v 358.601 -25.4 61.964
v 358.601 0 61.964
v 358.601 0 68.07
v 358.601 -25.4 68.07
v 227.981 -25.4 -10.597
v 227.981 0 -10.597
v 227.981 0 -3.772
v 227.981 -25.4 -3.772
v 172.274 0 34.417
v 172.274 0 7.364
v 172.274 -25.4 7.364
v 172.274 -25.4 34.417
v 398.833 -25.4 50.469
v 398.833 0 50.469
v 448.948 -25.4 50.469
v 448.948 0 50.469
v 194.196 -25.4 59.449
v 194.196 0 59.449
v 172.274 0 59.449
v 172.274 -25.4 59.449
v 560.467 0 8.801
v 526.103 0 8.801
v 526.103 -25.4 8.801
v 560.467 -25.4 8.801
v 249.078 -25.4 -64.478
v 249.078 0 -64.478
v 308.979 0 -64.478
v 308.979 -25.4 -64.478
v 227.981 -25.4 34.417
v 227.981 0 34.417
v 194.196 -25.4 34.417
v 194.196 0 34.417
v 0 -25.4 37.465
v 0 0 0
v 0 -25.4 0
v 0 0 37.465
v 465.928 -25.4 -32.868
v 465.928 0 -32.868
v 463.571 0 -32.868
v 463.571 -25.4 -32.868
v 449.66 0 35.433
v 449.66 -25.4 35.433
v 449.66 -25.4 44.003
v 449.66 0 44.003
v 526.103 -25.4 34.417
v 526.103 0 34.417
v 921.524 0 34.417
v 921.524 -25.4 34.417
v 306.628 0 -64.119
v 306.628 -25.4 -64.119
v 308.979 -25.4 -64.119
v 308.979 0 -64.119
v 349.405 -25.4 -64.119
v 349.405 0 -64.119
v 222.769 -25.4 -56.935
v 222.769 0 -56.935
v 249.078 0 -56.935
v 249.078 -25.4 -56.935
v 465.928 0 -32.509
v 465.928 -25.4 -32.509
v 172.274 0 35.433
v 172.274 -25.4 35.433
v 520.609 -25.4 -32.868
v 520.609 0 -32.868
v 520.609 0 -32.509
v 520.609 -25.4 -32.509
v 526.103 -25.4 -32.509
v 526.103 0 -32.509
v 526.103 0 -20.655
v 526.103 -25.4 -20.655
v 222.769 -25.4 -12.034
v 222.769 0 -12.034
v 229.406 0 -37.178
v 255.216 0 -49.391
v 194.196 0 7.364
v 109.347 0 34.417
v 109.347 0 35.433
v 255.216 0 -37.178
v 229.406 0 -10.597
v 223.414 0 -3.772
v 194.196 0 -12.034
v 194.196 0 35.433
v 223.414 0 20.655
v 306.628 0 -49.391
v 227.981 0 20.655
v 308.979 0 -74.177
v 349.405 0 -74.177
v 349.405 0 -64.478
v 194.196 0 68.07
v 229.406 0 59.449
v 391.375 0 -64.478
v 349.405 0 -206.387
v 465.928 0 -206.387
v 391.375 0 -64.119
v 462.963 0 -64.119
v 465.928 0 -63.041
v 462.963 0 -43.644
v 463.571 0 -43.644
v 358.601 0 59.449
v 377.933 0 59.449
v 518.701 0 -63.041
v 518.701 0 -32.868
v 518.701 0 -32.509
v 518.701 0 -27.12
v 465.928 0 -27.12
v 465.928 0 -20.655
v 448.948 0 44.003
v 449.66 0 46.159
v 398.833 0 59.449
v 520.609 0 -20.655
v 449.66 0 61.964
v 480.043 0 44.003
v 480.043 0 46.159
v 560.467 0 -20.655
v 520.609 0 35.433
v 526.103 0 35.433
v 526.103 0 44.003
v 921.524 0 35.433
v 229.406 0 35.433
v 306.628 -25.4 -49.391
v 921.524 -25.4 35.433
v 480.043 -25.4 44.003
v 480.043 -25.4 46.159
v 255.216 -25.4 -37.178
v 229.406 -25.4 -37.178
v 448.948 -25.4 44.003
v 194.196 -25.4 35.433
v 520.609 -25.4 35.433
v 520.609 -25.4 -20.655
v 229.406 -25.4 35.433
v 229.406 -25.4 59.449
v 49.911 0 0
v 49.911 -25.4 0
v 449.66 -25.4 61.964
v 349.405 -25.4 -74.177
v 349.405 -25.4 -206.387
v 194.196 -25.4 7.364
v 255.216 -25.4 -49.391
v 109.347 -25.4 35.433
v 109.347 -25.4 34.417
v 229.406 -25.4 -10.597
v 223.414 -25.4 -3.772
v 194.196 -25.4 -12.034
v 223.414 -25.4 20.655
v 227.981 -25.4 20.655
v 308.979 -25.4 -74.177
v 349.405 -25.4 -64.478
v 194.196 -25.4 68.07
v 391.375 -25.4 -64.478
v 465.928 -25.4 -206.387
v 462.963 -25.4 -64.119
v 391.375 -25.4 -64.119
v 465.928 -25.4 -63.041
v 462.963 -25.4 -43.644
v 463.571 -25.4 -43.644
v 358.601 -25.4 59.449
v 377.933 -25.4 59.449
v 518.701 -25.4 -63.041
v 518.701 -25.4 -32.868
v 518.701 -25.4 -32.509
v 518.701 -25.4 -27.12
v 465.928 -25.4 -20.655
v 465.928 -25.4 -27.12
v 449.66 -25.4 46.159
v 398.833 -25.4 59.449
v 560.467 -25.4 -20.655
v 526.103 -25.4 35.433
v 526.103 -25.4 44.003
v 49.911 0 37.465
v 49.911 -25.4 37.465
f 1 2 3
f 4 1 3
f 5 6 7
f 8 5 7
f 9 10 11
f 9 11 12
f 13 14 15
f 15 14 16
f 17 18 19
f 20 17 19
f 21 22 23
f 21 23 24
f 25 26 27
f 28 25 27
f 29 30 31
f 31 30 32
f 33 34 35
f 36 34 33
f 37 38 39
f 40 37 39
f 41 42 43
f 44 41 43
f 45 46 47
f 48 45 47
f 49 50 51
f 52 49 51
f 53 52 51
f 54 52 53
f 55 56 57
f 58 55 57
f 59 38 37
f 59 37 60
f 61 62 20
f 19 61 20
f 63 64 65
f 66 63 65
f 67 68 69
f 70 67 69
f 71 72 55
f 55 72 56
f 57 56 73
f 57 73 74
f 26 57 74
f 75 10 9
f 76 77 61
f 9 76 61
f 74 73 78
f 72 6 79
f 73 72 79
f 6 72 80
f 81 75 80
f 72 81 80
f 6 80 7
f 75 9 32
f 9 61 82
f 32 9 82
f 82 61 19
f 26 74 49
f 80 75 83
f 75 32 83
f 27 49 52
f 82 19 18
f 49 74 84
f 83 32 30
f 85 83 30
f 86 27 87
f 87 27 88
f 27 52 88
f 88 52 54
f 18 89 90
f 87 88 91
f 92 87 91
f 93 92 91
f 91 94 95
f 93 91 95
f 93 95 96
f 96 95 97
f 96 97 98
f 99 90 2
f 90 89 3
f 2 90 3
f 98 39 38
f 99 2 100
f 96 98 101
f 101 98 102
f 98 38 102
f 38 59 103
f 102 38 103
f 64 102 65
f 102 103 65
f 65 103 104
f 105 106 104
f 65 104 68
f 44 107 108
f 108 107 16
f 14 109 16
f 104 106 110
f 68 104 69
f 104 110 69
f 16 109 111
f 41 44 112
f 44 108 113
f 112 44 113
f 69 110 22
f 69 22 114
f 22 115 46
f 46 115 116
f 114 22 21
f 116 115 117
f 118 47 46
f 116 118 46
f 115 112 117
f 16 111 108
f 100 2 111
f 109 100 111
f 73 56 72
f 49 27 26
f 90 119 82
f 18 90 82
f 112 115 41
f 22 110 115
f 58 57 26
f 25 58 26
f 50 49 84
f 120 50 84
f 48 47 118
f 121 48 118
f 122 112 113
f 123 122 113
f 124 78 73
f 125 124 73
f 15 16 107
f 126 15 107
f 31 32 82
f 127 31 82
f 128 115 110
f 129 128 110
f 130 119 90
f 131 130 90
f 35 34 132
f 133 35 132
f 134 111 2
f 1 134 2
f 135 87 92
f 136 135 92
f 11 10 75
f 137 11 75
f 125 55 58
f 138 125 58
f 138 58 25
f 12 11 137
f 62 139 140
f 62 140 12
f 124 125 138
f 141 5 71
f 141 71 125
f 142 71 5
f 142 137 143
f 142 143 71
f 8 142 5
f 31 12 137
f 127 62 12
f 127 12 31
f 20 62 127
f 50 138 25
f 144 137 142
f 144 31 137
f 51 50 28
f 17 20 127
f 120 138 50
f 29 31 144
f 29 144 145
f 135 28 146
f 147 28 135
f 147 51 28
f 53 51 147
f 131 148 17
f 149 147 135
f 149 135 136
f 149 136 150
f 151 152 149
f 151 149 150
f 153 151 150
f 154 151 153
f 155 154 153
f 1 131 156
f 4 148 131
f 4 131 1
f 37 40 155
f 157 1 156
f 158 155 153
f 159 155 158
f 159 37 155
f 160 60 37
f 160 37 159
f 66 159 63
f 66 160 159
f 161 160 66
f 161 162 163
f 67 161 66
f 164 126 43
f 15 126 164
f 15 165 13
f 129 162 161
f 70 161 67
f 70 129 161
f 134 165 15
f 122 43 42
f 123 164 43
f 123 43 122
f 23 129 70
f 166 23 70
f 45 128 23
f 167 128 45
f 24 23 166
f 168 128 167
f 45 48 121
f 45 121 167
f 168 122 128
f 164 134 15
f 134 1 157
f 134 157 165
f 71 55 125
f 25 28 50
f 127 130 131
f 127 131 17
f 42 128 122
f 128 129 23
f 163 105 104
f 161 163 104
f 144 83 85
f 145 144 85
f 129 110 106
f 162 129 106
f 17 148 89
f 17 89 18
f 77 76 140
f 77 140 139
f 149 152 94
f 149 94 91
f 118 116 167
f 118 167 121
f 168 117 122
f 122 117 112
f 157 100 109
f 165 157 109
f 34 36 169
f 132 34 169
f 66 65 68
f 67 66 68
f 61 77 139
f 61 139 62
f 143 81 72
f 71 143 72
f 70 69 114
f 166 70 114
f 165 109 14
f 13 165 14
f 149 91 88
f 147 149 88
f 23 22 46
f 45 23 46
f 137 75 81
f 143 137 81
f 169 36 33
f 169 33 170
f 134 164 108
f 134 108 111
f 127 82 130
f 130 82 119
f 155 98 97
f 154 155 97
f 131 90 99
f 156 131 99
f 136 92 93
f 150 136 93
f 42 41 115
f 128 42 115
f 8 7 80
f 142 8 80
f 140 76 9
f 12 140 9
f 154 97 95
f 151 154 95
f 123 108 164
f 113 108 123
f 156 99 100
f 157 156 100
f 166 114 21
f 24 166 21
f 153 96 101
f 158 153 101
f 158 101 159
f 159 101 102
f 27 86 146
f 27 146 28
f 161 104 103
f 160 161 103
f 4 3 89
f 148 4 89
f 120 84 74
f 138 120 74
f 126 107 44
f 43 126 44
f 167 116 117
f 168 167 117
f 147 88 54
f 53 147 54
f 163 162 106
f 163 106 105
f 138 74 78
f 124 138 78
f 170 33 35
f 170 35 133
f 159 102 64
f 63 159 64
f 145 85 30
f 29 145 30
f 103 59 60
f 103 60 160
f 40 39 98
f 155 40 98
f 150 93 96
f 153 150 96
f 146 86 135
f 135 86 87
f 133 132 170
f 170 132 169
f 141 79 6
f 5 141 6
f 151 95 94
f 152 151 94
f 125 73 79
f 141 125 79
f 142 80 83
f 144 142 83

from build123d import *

# Parameters (mm, degrees)
F0_W     = 49.9110035598
F0_H     = 37.4650023878
F1_DEPTH = 25.4
F0_W_2   = 62.9266947508
F0_H_2   = 1.0160021484
F0_W_3   = 21.9223797321
F0_H_3   = 24.016302079
F0_W_4   = 35.2101027966
F0_H_4   = 27.0532034338
F0_W_5   = 0.7122159004
F0_H_5   = 2.1552592516
F0_W_6   = 30.3827822208
F0_H_6   = 8.570253849
F0_W_7   = 40.5665338039
F0_W_8   = 40.4263734818
F0_H_7   = 0.3592148423
F0_H_8   = 9.6986740828
F0_W_9   = 5.4933428764
F0_W_10  = 395.4214453697
F0_H_9   = 25.6163654849
F0_H_10  = 29.4552231207
F0_W_11  = 34.3640446663
F0_H_11  = 11.8539407849
F0_W_12  = 52.7721643448
F0_H_12  = 30.1736667752
F0_W_13  = 1.9087791443
F0_H_13  = 0.3592073917


# Not quite as in the source:
# - ends of sketch curves that miss each other by under 0.0002 mm in the source are joined


with BuildPart() as f1:
    # F0 (on Front) → F1 (new body)
    with BuildSketch(Plane.XZ):
        with Locations((24.9555017799, 18.7325011939)):
            Rectangle(F0_W, F0_H)
    extrude(amount=F1_DEPTH)


with BuildPart() as f1b:
    # F0 (on Front) → F1, piece 2 (new body)
    with BuildSketch(Plane.XZ):
        with Locations((140.8103480935, 34.9250007421)):
            Rectangle(F0_W_2, F0_H_2)
        with Locations((183.234885335, 47.4411528558)):
            Rectangle(F0_W_3, F0_H_3)
        with Locations((183.234885335, 34.9250007421)):
            Rectangle(F0_W_3, F0_H_2)
        with Locations((211.8011265993, 47.4411528558)):
            Rectangle(F0_W_4, F0_H_3)
        with Locations((183.234885335, 20.890397951)):
            Rectangle(F0_W_3, F0_H_4)
        Polygon((227.9811799526, 34.4169996679), (194.196075201, 34.4169996679), (194.196075201, 7.3637962341), (223.4135717154, 7.3637962341), (223.4135717154, 20.6545889378), (227.9811799526, 20.6545889378), align=None)
        Polygon((194.196075201, 68.0703520775), (194.196075201, 59.4493038952), (229.4061779976, 59.4493038952), (229.4061779976, 61.9637668133), (358.6011528969, 61.9637668133), (358.6011528969, 68.0703520775), align=None)
        Polygon((229.4061779976, 61.9637668133), (229.4061779976, 59.4493038952), (231.9025844336, 59.4493038952), (358.6011528969, 59.4493038952), (358.6011528969, 61.9637668133), align=None)
        Polygon((223.4135717154, 7.3637962341), (194.196075201, 7.3637962341), (194.196075201, -12.0335444808), (222.7686345577, -12.0335444808), (222.7686345577, -4.849344492), (227.9811799526, -4.849344492), (227.9811799526, -3.7717141677), (223.4135717154, -3.7717141677), align=None)
        Polygon((358.6011528969, 61.9637668133), (358.6011528969, 59.4493001699), (377.9325187206, 59.4493038952), (398.8327085972, 59.4492964447), (398.8327085972, 50.4690408707), (448.9478468895, 50.4690408707), (448.9478468895, 46.1585149169), (449.6600627899, 46.1585149169), (449.6600627899, 61.9637668133), align=None)
        Polygon((229.4061779976, -12.0335444808), (222.7686345577, -12.0335444808), (222.7686345577, -56.9348335266), (249.0781396627, -56.9348335266), (249.0781396627, -37.1782630682), (229.4061779976, -37.1782630682), align=None)
        Polygon((222.7686345577, -4.849344492), (222.7686345577, -12.0335444808), (229.4061779976, -12.0335444808), (229.4061779976, -10.5967074633), (227.9811799526, -10.5967074633), (227.9811799526, -4.849344492), align=None)
        with Locations((449.3039548397, 45.0808852911)):
            Rectangle(F0_W_5, F0_H_5)
        with Locations((464.8514539003, 45.0808852911)):
            Rectangle(F0_W_6, F0_H_5)
        Polygon((249.0781396627, -37.1782630682), (249.0781396627, -56.9348335266), (306.6283762455, -56.9348335266), (306.6283762455, -49.3914186954), (255.2164494991, -49.3914186954), (255.2164494991, -37.1782630682), align=None)
        Polygon((306.6283762455, -56.9348335266), (249.0781396627, -56.9348335266), (249.0781396627, -64.4782409072), (308.9790642262, -64.4782409072), (308.9790642262, -64.1190260649), (306.6283762455, -64.1190260649), align=None)
        with Locations((464.8514539003, 39.7181287408)):
            Rectangle(F0_W_6, F0_H_6)
        with Locations((500.3261119127, 39.7181287408)):
            Rectangle(F0_W_7, F0_H_6)
        with Locations((329.192250967, -64.298633486)):
            Rectangle(F0_W_8, F0_H_7)
        with Locations((329.192250967, -69.3275779486)):
            Rectangle(F0_W_8, F0_H_8)
        with Locations((523.3560502529, 39.7181287408)):
            Rectangle(F0_W_9, F0_H_6)
        Polygon((391.3746476173, -64.4782409072), (349.4054377079, -64.4782409072), (349.4054377079, -74.1769149899), (443.1339204311, -74.1769149899), (443.1339204311, -64.1190260649), (391.3746476173, -64.1190260649), align=None)
        with Locations((523.3560502529, 34.9250007421)):
            Rectangle(F0_W_9, F0_H_2)
        Polygon((443.1339204311, -74.1769149899), (349.4054377079, -74.1769149899), (349.4054377079, -206.3867151737), (465.9284353256, -206.3867151737), (465.9284353256, -63.0414038897), (462.9626870155, -63.0414038897), (462.9626870155, -64.1190260649), (443.1339204311, -64.1190260649), align=None)
        with Locations((723.813444376, 34.9250007421)):
            Rectangle(F0_W_10, F0_H_2)
        with Locations((523.3560502529, 21.6088169254)):
            Rectangle(F0_W_9, F0_H_9)
        with Locations((523.3560502529, -5.9269773774)):
            Rectangle(F0_W_9, F0_H_10)
        with Locations((543.2847440243, -5.9269773774)):
            Rectangle(F0_W_11, F0_H_10)
        with Locations((523.3560502529, -26.5815593302)):
            Rectangle(F0_W_9, F0_H_11)
        Polygon((520.6093788147, -32.5085297227), (520.6093788147, -20.6545889378), (465.9284353256, -20.6545889378), (465.9284353256, -27.1203722805), (518.7005996704, -27.1203722805), (518.7005996704, -32.5085297227), align=None)
        with Locations((492.314517498, -47.954570502)):
            Rectangle(F0_W_12, F0_H_12)
        Polygon((462.9626870155, -63.0414038897), (465.9284353256, -63.0414038897), (465.9284353256, -32.8677371144), (463.5714888573, -32.8677371144), (463.5714888573, -43.6440333724), (462.9626870155, -43.6440333724), align=None)
        with Locations((519.6549892426, -32.6881334186)):
            Rectangle(F0_W_13, F0_H_13)
        with Locations((492.314517498, -32.6881334186)):
            Rectangle(F0_W_12, F0_H_13)
    extrude(amount=F1_DEPTH)


solid = Compound([f1.part, f1b.part])
